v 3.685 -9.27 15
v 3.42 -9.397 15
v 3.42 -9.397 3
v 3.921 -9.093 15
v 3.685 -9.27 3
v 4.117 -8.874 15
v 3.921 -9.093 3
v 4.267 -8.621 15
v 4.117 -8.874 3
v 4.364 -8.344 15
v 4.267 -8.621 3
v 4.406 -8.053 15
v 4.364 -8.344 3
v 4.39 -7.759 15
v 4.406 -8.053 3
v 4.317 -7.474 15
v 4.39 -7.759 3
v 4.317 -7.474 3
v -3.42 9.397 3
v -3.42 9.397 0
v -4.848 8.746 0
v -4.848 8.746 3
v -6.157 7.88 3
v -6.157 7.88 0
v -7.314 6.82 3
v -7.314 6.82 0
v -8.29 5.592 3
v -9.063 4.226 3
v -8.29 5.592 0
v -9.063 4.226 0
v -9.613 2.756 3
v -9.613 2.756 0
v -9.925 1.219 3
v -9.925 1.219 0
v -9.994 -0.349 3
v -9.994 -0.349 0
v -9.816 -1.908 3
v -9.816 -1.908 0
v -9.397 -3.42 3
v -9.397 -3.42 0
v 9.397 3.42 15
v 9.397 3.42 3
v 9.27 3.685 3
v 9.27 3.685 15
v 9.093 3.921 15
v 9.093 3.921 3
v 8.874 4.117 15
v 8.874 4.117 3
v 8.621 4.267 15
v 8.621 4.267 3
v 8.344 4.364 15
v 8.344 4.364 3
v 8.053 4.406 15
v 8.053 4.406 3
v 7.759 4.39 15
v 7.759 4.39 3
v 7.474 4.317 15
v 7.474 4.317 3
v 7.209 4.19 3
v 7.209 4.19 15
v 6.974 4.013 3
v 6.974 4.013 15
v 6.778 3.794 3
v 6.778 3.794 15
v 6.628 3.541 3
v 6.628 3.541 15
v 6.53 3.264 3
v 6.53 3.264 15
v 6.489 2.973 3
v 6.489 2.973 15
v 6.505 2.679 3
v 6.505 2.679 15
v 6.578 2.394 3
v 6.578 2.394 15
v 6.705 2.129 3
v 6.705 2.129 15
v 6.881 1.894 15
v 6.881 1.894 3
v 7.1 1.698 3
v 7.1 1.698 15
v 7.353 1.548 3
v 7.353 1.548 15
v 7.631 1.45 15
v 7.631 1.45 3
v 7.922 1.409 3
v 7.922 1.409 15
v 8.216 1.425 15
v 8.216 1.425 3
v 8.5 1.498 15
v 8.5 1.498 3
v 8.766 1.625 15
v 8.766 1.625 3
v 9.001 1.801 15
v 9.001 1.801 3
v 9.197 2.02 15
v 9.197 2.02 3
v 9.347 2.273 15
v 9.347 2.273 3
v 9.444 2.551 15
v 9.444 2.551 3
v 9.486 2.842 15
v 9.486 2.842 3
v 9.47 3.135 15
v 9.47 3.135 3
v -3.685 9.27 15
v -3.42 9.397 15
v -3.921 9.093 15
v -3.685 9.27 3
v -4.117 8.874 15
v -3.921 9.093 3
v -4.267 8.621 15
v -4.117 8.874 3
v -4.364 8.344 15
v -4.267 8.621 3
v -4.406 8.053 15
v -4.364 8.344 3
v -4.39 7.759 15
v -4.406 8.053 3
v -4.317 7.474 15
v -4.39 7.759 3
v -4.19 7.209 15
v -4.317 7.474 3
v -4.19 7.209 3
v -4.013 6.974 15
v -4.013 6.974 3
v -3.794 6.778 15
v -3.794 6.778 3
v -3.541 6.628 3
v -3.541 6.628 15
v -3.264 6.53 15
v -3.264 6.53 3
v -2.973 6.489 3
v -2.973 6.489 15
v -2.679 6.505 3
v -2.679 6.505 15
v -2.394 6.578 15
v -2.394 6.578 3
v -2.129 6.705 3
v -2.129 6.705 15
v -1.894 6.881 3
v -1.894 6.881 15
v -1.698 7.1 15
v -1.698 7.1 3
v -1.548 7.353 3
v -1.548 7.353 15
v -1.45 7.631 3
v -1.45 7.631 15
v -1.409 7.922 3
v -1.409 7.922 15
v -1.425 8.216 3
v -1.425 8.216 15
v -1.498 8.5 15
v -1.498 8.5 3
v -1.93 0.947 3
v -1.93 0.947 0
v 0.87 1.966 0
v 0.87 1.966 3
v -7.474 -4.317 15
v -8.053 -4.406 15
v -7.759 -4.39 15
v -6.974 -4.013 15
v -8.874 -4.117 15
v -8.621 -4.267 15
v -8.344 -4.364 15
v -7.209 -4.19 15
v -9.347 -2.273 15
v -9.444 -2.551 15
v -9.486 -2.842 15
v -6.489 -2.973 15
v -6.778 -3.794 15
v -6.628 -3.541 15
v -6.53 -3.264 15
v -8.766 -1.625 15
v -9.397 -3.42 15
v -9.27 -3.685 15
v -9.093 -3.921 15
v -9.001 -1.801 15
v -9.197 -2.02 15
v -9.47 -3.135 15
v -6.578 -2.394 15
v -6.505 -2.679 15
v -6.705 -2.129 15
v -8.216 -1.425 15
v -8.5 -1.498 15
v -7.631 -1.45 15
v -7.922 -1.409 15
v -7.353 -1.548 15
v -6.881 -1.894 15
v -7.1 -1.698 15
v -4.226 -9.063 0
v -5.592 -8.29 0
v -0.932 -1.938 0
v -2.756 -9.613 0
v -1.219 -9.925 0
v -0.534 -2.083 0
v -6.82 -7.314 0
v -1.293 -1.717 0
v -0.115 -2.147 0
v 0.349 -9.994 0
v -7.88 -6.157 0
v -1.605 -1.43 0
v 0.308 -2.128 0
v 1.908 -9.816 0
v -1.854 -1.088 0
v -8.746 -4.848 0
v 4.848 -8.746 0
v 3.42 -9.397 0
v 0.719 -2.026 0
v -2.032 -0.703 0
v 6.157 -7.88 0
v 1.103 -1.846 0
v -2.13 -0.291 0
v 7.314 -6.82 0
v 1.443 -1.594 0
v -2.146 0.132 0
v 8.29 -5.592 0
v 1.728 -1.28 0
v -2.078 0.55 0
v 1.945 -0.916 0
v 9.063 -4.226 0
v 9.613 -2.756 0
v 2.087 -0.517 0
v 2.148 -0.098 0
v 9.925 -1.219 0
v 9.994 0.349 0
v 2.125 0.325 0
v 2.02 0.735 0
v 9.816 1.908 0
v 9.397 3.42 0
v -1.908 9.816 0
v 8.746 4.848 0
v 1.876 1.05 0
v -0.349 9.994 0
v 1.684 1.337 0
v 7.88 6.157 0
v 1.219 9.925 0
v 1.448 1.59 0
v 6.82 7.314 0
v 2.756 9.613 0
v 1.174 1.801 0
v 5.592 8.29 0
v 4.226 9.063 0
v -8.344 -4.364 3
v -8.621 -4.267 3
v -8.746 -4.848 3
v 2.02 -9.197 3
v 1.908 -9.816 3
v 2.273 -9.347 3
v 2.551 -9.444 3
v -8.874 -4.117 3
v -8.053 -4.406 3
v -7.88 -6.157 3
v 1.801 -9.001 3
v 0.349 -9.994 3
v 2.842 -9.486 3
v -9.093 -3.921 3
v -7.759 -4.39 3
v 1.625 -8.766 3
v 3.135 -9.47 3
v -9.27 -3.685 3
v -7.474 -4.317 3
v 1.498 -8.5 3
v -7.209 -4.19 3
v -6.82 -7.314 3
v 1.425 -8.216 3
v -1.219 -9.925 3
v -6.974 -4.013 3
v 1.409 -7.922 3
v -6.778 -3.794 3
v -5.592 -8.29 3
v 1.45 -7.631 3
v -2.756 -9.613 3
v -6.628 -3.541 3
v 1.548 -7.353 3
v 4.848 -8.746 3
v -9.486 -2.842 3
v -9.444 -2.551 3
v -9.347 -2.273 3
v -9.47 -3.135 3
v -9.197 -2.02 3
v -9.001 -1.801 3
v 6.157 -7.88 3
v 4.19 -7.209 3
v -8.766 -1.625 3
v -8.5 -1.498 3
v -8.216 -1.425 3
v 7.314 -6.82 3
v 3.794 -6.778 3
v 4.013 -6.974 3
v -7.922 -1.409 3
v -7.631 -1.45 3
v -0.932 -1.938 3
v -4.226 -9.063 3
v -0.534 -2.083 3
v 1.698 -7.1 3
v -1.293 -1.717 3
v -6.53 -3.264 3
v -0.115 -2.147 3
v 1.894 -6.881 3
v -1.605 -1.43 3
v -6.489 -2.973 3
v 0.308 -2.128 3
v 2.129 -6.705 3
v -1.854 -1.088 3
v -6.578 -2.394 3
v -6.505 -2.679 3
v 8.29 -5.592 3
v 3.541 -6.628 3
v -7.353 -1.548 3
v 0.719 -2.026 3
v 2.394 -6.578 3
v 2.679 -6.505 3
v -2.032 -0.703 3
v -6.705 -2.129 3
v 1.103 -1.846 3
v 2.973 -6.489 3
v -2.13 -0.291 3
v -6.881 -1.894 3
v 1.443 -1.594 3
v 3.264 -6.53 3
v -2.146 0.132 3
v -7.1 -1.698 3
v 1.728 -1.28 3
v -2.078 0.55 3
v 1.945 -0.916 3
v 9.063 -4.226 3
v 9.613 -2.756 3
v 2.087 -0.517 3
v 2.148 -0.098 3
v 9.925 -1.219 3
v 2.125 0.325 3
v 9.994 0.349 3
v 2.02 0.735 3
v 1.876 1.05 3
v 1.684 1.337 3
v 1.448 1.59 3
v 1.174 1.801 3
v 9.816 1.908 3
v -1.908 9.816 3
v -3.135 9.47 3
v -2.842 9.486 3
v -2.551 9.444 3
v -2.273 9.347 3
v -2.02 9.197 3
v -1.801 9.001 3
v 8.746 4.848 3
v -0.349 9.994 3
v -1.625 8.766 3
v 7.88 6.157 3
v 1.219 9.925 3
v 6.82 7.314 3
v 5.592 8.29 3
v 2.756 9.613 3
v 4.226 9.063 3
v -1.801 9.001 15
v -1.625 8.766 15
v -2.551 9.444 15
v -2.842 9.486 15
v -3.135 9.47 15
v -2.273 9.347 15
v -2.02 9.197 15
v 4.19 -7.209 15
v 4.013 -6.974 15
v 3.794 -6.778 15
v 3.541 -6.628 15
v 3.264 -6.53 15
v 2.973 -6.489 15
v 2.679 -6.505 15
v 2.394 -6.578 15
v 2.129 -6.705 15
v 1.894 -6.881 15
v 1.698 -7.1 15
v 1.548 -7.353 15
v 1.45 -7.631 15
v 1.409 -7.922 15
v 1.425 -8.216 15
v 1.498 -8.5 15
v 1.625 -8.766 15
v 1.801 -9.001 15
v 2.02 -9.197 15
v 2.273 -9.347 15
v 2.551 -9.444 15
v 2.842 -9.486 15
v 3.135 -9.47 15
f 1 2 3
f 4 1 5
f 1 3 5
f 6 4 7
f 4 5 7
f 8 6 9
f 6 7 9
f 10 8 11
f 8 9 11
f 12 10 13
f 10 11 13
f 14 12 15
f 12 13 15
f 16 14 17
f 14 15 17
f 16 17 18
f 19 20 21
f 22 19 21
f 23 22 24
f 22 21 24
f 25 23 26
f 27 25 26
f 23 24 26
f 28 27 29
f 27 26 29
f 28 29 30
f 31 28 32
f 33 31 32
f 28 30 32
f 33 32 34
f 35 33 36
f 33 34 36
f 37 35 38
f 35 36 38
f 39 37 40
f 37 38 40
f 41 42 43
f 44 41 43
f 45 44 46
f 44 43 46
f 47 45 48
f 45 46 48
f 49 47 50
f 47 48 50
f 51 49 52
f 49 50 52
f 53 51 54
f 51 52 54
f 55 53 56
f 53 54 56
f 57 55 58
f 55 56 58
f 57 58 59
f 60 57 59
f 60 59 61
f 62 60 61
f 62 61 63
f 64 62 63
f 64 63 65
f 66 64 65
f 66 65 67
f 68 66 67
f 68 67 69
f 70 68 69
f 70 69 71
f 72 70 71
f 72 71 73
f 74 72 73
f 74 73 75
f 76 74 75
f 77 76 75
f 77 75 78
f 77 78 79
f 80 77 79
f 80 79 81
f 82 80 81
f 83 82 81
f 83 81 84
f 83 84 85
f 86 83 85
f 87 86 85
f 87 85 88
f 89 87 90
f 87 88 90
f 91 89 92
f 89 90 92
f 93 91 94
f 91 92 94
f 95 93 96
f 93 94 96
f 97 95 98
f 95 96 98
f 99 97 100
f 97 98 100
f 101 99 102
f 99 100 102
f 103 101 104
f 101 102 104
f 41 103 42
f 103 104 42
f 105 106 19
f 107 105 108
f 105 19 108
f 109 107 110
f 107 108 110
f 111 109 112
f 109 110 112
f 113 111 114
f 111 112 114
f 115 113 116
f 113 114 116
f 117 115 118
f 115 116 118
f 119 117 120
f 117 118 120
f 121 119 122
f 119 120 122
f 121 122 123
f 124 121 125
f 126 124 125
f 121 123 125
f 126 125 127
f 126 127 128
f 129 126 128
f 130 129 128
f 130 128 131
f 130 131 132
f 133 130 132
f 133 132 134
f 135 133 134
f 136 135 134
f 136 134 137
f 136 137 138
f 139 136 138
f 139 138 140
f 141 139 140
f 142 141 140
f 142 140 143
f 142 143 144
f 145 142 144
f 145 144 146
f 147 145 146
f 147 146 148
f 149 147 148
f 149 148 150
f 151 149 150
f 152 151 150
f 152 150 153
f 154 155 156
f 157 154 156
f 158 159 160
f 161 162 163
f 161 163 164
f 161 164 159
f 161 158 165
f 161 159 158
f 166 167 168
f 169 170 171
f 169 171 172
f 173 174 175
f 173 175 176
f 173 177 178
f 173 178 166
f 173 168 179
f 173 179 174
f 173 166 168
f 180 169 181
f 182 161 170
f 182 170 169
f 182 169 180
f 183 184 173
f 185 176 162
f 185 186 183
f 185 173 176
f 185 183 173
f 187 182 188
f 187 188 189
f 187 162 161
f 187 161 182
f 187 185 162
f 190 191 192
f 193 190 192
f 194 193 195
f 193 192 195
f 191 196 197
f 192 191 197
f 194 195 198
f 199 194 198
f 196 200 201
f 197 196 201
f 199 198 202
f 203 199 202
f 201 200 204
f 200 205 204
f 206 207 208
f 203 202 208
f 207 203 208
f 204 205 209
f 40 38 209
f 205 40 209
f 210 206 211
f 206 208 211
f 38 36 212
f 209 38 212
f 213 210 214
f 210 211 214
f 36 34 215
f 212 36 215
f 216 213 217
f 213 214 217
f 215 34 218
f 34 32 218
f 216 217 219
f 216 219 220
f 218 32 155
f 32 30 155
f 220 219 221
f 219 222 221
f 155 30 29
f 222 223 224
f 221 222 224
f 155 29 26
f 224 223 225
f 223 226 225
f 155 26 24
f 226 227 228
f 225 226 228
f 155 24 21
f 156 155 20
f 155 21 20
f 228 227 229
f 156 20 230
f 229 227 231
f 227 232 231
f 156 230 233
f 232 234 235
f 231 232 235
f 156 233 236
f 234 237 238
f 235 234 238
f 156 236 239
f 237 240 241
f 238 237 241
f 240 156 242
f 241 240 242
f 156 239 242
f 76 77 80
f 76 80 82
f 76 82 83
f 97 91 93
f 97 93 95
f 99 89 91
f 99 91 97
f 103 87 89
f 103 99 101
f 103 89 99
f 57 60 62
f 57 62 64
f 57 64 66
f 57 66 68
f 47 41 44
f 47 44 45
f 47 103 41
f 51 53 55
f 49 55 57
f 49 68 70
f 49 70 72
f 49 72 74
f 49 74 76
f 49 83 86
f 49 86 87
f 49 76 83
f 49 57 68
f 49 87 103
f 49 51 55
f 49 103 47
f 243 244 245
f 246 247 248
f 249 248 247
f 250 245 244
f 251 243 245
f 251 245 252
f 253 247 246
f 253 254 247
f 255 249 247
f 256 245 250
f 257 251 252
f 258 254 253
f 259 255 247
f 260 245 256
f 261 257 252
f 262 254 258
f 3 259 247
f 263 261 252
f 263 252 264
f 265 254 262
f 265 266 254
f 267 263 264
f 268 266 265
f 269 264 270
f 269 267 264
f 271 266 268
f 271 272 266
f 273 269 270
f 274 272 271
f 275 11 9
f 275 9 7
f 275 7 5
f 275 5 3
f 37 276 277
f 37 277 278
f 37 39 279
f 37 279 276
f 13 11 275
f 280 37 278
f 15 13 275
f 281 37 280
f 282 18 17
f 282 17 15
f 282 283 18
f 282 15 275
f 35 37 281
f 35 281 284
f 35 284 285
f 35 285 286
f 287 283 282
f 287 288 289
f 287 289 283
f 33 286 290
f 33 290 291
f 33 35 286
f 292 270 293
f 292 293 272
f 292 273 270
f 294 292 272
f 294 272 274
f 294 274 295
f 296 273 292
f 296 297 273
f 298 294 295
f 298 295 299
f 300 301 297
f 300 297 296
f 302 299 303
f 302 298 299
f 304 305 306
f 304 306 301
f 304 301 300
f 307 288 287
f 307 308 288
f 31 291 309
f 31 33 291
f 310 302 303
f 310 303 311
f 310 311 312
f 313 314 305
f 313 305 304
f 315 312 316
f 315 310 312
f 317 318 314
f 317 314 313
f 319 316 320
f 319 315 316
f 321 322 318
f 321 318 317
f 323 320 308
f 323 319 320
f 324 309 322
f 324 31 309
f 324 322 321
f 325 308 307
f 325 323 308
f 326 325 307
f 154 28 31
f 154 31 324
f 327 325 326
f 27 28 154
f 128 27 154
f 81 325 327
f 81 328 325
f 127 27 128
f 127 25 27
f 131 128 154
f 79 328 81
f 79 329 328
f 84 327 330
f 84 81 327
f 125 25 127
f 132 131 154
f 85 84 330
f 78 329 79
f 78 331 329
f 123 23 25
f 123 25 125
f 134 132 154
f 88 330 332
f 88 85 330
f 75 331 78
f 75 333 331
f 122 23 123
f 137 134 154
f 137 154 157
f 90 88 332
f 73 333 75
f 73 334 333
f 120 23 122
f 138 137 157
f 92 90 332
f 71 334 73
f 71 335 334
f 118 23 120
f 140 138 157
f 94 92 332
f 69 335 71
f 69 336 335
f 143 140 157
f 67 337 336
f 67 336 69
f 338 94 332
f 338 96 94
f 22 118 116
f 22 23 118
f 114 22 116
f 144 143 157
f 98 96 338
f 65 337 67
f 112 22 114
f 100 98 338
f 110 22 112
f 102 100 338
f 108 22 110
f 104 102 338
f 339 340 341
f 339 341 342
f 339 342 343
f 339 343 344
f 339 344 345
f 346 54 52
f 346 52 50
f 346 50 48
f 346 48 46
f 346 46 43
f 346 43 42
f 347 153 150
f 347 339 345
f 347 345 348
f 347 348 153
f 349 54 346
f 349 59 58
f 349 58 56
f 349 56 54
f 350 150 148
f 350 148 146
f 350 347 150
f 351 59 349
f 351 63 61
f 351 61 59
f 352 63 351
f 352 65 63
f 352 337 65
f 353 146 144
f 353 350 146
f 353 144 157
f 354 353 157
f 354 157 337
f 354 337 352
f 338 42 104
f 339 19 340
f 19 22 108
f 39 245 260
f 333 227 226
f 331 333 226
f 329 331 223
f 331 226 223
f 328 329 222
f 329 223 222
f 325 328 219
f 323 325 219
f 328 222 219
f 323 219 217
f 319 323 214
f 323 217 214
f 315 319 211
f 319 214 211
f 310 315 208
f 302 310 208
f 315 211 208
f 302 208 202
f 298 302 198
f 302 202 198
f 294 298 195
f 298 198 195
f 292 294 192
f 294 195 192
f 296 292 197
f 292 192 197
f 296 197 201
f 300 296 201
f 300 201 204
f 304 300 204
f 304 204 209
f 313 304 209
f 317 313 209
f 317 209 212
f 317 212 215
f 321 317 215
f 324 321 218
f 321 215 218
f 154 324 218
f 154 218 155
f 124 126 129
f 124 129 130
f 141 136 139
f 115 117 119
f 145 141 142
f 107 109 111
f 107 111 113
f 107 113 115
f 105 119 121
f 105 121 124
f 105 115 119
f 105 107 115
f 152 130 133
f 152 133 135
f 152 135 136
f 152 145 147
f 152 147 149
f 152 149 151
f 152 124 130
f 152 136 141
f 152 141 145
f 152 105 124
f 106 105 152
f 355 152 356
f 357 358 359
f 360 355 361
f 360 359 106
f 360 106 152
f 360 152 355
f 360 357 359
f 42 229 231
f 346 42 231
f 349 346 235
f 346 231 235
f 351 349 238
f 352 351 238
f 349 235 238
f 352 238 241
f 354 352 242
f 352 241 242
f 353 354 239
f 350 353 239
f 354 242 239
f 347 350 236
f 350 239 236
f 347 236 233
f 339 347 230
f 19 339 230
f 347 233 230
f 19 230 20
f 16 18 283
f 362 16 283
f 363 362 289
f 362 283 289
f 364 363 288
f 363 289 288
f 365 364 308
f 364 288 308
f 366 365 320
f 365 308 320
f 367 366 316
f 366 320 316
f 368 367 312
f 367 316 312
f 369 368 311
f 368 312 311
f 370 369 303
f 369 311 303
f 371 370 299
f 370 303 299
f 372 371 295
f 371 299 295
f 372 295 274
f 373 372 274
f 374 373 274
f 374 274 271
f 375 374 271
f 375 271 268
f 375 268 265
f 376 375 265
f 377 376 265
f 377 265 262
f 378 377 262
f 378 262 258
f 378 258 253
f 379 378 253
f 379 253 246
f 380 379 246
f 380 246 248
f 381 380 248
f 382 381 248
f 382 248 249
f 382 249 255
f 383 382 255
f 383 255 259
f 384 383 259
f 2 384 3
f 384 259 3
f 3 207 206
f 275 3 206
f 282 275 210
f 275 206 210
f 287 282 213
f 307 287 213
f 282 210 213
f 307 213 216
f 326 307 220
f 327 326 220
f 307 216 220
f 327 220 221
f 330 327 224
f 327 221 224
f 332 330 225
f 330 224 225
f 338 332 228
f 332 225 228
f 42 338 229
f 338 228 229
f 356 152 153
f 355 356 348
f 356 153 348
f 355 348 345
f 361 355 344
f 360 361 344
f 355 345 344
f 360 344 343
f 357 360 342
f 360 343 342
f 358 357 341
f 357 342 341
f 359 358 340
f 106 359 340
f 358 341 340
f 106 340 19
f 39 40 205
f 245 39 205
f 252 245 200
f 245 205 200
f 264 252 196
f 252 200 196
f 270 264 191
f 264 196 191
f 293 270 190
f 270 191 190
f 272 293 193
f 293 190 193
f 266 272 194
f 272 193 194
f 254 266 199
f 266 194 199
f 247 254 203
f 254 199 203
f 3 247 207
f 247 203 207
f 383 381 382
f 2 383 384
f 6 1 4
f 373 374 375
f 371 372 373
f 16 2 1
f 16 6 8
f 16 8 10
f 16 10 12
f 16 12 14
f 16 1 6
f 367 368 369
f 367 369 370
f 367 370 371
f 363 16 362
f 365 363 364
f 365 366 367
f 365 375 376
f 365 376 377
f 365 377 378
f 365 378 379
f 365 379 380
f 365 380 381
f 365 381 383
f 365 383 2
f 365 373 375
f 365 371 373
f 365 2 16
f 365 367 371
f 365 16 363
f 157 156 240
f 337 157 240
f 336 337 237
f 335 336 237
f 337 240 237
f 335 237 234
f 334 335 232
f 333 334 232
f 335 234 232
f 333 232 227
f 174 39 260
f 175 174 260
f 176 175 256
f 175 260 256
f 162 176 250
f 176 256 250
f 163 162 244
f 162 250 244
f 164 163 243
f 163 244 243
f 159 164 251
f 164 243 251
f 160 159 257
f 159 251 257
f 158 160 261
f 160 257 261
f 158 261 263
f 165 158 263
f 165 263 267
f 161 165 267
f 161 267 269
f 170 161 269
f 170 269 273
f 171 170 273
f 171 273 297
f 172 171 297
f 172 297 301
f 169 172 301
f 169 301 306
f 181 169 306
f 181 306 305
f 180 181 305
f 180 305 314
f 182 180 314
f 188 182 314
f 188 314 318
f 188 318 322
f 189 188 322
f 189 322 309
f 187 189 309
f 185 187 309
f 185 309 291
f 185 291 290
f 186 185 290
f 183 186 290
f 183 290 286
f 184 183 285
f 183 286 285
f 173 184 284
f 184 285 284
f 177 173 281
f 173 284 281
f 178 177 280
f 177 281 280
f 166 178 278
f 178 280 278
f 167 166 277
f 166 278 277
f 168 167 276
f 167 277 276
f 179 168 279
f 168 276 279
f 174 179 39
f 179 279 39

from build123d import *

# Parameters (mm, degrees)
F0_R     = 1.5
F1_DEPTH = 3
F2_DEPTH = 15
F4_ANGLE = 20


# Not quite as in the source:
# - a feature names something its author has since deleted; it is built from what else it names


with BuildPart() as f1:
    # F0 (on Top) → F1 (new body)
    with BuildSketch(Plane.XY):
        with BuildLine():
            ThreePointArc((4.3e-09, -10), (7.0710678134, -7.0710678103), (10, 0))
            ThreePointArc((10, 0), (7.0710678119, 7.0710678119), (0, 10))
            ThreePointArc((0, 10), (-7.0710678074, 7.0710678163), (-10, 1.26e-08))
            ThreePointArc((-10, 1.26e-08), (-7.0710678148, -7.0710678089), (4.3e-09, -10))
        make_face()
        with BuildLine():
            ThreePointArc((1.5, -8.5), (1.0606601733, -9.5606601703), (4.3e-09, -10))
            ThreePointArc((4.3e-09, -10), (-1.0606601733, -7.4393398297), (1.5, -8.5))
        make_face(mode=Mode.SUBTRACT)
        with BuildLine():
            ThreePointArc((-7, 0), (-8.5000000063, -1.5), (-10, 1.26e-08))
            ThreePointArc((-10, 1.26e-08), (-8.4999999937, 1.5), (-7, 0))
        make_face(mode=Mode.SUBTRACT)
        with BuildLine():
            ThreePointArc((1.4899664426, 1.55), (1.9781213122, 0.842339643), (2.15, 0))
            ThreePointArc((2.15, 0), (-0.842339643, -1.9781213122), (-1.4899664426, 1.55))
            ThreePointArc((-1.4899664426, 1.55), (0, 2.15), (1.4899664426, 1.55))
        make_face(mode=Mode.SUBTRACT)
        with Locations((8.5, 0)):
            Circle(F0_R, mode=Mode.SUBTRACT)
        with BuildLine():
            ThreePointArc((1.5, 8.5), (-1.0606601718, 7.4393398282), (0, 10))
            ThreePointArc((0, 10), (1.0606601718, 9.5606601718), (1.5, 8.5))
        make_face(mode=Mode.SUBTRACT)
        with BuildLine():
            ThreePointArc((-7, 0), (-8.4999999937, 1.5), (-10, 1.26e-08))
            ThreePointArc((-10, 1.26e-08), (-8.5000000063, -1.5), (-7, 0))
        make_face()
        with BuildLine():
            ThreePointArc((1.5, -8.5), (-1.0606601733, -7.4393398297), (4.3e-09, -10))
            ThreePointArc((4.3e-09, -10), (1.0606601733, -9.5606601703), (1.5, -8.5))
        make_face()
        with Locations((8.5, 0)):
            Circle(F0_R)
        with BuildLine():
            ThreePointArc((1.5, 8.5), (1.0606601718, 9.5606601718), (0, 10))
            ThreePointArc((0, 10), (-1.0606601718, 7.4393398282), (1.5, 8.5))
        make_face()
        with BuildLine():
            Line((-1.4899664426, 1.55), (1.4899664426, 1.55))
            ThreePointArc((1.4899664426, 1.55), (0, 2.15), (-1.4899664426, 1.55))
        make_face()
    extrude(amount=F1_DEPTH)

    # F0 (on Top) → F2 (join)
    with BuildSketch(Plane.XY):
        with BuildLine():
            ThreePointArc((1.5, 8.5), (1.0606601718, 9.5606601718), (0, 10))
            ThreePointArc((0, 10), (-1.0606601718, 7.4393398282), (1.5, 8.5))
        make_face()
        with BuildLine():
            ThreePointArc((-7, 0), (-8.4999999937, 1.5), (-10, 1.26e-08))
            ThreePointArc((-10, 1.26e-08), (-8.5000000063, -1.5), (-7, 0))
        make_face()
        with BuildLine():
            ThreePointArc((1.5, -8.5), (-1.0606601733, -7.4393398297), (4.3e-09, -10))
            ThreePointArc((4.3e-09, -10), (1.0606601733, -9.5606601703), (1.5, -8.5))
        make_face()
        with Locations((8.5, 0)):
            Circle(F0_R)
    extrude(amount=F2_DEPTH)


with BuildPart() as f1_1:
    # F4: moved
    add(f1.part.rotate(Axis((0, 0, 24.3583247066), (0, 0, 1)), F4_ANGLE))


solid = f1_1.part
